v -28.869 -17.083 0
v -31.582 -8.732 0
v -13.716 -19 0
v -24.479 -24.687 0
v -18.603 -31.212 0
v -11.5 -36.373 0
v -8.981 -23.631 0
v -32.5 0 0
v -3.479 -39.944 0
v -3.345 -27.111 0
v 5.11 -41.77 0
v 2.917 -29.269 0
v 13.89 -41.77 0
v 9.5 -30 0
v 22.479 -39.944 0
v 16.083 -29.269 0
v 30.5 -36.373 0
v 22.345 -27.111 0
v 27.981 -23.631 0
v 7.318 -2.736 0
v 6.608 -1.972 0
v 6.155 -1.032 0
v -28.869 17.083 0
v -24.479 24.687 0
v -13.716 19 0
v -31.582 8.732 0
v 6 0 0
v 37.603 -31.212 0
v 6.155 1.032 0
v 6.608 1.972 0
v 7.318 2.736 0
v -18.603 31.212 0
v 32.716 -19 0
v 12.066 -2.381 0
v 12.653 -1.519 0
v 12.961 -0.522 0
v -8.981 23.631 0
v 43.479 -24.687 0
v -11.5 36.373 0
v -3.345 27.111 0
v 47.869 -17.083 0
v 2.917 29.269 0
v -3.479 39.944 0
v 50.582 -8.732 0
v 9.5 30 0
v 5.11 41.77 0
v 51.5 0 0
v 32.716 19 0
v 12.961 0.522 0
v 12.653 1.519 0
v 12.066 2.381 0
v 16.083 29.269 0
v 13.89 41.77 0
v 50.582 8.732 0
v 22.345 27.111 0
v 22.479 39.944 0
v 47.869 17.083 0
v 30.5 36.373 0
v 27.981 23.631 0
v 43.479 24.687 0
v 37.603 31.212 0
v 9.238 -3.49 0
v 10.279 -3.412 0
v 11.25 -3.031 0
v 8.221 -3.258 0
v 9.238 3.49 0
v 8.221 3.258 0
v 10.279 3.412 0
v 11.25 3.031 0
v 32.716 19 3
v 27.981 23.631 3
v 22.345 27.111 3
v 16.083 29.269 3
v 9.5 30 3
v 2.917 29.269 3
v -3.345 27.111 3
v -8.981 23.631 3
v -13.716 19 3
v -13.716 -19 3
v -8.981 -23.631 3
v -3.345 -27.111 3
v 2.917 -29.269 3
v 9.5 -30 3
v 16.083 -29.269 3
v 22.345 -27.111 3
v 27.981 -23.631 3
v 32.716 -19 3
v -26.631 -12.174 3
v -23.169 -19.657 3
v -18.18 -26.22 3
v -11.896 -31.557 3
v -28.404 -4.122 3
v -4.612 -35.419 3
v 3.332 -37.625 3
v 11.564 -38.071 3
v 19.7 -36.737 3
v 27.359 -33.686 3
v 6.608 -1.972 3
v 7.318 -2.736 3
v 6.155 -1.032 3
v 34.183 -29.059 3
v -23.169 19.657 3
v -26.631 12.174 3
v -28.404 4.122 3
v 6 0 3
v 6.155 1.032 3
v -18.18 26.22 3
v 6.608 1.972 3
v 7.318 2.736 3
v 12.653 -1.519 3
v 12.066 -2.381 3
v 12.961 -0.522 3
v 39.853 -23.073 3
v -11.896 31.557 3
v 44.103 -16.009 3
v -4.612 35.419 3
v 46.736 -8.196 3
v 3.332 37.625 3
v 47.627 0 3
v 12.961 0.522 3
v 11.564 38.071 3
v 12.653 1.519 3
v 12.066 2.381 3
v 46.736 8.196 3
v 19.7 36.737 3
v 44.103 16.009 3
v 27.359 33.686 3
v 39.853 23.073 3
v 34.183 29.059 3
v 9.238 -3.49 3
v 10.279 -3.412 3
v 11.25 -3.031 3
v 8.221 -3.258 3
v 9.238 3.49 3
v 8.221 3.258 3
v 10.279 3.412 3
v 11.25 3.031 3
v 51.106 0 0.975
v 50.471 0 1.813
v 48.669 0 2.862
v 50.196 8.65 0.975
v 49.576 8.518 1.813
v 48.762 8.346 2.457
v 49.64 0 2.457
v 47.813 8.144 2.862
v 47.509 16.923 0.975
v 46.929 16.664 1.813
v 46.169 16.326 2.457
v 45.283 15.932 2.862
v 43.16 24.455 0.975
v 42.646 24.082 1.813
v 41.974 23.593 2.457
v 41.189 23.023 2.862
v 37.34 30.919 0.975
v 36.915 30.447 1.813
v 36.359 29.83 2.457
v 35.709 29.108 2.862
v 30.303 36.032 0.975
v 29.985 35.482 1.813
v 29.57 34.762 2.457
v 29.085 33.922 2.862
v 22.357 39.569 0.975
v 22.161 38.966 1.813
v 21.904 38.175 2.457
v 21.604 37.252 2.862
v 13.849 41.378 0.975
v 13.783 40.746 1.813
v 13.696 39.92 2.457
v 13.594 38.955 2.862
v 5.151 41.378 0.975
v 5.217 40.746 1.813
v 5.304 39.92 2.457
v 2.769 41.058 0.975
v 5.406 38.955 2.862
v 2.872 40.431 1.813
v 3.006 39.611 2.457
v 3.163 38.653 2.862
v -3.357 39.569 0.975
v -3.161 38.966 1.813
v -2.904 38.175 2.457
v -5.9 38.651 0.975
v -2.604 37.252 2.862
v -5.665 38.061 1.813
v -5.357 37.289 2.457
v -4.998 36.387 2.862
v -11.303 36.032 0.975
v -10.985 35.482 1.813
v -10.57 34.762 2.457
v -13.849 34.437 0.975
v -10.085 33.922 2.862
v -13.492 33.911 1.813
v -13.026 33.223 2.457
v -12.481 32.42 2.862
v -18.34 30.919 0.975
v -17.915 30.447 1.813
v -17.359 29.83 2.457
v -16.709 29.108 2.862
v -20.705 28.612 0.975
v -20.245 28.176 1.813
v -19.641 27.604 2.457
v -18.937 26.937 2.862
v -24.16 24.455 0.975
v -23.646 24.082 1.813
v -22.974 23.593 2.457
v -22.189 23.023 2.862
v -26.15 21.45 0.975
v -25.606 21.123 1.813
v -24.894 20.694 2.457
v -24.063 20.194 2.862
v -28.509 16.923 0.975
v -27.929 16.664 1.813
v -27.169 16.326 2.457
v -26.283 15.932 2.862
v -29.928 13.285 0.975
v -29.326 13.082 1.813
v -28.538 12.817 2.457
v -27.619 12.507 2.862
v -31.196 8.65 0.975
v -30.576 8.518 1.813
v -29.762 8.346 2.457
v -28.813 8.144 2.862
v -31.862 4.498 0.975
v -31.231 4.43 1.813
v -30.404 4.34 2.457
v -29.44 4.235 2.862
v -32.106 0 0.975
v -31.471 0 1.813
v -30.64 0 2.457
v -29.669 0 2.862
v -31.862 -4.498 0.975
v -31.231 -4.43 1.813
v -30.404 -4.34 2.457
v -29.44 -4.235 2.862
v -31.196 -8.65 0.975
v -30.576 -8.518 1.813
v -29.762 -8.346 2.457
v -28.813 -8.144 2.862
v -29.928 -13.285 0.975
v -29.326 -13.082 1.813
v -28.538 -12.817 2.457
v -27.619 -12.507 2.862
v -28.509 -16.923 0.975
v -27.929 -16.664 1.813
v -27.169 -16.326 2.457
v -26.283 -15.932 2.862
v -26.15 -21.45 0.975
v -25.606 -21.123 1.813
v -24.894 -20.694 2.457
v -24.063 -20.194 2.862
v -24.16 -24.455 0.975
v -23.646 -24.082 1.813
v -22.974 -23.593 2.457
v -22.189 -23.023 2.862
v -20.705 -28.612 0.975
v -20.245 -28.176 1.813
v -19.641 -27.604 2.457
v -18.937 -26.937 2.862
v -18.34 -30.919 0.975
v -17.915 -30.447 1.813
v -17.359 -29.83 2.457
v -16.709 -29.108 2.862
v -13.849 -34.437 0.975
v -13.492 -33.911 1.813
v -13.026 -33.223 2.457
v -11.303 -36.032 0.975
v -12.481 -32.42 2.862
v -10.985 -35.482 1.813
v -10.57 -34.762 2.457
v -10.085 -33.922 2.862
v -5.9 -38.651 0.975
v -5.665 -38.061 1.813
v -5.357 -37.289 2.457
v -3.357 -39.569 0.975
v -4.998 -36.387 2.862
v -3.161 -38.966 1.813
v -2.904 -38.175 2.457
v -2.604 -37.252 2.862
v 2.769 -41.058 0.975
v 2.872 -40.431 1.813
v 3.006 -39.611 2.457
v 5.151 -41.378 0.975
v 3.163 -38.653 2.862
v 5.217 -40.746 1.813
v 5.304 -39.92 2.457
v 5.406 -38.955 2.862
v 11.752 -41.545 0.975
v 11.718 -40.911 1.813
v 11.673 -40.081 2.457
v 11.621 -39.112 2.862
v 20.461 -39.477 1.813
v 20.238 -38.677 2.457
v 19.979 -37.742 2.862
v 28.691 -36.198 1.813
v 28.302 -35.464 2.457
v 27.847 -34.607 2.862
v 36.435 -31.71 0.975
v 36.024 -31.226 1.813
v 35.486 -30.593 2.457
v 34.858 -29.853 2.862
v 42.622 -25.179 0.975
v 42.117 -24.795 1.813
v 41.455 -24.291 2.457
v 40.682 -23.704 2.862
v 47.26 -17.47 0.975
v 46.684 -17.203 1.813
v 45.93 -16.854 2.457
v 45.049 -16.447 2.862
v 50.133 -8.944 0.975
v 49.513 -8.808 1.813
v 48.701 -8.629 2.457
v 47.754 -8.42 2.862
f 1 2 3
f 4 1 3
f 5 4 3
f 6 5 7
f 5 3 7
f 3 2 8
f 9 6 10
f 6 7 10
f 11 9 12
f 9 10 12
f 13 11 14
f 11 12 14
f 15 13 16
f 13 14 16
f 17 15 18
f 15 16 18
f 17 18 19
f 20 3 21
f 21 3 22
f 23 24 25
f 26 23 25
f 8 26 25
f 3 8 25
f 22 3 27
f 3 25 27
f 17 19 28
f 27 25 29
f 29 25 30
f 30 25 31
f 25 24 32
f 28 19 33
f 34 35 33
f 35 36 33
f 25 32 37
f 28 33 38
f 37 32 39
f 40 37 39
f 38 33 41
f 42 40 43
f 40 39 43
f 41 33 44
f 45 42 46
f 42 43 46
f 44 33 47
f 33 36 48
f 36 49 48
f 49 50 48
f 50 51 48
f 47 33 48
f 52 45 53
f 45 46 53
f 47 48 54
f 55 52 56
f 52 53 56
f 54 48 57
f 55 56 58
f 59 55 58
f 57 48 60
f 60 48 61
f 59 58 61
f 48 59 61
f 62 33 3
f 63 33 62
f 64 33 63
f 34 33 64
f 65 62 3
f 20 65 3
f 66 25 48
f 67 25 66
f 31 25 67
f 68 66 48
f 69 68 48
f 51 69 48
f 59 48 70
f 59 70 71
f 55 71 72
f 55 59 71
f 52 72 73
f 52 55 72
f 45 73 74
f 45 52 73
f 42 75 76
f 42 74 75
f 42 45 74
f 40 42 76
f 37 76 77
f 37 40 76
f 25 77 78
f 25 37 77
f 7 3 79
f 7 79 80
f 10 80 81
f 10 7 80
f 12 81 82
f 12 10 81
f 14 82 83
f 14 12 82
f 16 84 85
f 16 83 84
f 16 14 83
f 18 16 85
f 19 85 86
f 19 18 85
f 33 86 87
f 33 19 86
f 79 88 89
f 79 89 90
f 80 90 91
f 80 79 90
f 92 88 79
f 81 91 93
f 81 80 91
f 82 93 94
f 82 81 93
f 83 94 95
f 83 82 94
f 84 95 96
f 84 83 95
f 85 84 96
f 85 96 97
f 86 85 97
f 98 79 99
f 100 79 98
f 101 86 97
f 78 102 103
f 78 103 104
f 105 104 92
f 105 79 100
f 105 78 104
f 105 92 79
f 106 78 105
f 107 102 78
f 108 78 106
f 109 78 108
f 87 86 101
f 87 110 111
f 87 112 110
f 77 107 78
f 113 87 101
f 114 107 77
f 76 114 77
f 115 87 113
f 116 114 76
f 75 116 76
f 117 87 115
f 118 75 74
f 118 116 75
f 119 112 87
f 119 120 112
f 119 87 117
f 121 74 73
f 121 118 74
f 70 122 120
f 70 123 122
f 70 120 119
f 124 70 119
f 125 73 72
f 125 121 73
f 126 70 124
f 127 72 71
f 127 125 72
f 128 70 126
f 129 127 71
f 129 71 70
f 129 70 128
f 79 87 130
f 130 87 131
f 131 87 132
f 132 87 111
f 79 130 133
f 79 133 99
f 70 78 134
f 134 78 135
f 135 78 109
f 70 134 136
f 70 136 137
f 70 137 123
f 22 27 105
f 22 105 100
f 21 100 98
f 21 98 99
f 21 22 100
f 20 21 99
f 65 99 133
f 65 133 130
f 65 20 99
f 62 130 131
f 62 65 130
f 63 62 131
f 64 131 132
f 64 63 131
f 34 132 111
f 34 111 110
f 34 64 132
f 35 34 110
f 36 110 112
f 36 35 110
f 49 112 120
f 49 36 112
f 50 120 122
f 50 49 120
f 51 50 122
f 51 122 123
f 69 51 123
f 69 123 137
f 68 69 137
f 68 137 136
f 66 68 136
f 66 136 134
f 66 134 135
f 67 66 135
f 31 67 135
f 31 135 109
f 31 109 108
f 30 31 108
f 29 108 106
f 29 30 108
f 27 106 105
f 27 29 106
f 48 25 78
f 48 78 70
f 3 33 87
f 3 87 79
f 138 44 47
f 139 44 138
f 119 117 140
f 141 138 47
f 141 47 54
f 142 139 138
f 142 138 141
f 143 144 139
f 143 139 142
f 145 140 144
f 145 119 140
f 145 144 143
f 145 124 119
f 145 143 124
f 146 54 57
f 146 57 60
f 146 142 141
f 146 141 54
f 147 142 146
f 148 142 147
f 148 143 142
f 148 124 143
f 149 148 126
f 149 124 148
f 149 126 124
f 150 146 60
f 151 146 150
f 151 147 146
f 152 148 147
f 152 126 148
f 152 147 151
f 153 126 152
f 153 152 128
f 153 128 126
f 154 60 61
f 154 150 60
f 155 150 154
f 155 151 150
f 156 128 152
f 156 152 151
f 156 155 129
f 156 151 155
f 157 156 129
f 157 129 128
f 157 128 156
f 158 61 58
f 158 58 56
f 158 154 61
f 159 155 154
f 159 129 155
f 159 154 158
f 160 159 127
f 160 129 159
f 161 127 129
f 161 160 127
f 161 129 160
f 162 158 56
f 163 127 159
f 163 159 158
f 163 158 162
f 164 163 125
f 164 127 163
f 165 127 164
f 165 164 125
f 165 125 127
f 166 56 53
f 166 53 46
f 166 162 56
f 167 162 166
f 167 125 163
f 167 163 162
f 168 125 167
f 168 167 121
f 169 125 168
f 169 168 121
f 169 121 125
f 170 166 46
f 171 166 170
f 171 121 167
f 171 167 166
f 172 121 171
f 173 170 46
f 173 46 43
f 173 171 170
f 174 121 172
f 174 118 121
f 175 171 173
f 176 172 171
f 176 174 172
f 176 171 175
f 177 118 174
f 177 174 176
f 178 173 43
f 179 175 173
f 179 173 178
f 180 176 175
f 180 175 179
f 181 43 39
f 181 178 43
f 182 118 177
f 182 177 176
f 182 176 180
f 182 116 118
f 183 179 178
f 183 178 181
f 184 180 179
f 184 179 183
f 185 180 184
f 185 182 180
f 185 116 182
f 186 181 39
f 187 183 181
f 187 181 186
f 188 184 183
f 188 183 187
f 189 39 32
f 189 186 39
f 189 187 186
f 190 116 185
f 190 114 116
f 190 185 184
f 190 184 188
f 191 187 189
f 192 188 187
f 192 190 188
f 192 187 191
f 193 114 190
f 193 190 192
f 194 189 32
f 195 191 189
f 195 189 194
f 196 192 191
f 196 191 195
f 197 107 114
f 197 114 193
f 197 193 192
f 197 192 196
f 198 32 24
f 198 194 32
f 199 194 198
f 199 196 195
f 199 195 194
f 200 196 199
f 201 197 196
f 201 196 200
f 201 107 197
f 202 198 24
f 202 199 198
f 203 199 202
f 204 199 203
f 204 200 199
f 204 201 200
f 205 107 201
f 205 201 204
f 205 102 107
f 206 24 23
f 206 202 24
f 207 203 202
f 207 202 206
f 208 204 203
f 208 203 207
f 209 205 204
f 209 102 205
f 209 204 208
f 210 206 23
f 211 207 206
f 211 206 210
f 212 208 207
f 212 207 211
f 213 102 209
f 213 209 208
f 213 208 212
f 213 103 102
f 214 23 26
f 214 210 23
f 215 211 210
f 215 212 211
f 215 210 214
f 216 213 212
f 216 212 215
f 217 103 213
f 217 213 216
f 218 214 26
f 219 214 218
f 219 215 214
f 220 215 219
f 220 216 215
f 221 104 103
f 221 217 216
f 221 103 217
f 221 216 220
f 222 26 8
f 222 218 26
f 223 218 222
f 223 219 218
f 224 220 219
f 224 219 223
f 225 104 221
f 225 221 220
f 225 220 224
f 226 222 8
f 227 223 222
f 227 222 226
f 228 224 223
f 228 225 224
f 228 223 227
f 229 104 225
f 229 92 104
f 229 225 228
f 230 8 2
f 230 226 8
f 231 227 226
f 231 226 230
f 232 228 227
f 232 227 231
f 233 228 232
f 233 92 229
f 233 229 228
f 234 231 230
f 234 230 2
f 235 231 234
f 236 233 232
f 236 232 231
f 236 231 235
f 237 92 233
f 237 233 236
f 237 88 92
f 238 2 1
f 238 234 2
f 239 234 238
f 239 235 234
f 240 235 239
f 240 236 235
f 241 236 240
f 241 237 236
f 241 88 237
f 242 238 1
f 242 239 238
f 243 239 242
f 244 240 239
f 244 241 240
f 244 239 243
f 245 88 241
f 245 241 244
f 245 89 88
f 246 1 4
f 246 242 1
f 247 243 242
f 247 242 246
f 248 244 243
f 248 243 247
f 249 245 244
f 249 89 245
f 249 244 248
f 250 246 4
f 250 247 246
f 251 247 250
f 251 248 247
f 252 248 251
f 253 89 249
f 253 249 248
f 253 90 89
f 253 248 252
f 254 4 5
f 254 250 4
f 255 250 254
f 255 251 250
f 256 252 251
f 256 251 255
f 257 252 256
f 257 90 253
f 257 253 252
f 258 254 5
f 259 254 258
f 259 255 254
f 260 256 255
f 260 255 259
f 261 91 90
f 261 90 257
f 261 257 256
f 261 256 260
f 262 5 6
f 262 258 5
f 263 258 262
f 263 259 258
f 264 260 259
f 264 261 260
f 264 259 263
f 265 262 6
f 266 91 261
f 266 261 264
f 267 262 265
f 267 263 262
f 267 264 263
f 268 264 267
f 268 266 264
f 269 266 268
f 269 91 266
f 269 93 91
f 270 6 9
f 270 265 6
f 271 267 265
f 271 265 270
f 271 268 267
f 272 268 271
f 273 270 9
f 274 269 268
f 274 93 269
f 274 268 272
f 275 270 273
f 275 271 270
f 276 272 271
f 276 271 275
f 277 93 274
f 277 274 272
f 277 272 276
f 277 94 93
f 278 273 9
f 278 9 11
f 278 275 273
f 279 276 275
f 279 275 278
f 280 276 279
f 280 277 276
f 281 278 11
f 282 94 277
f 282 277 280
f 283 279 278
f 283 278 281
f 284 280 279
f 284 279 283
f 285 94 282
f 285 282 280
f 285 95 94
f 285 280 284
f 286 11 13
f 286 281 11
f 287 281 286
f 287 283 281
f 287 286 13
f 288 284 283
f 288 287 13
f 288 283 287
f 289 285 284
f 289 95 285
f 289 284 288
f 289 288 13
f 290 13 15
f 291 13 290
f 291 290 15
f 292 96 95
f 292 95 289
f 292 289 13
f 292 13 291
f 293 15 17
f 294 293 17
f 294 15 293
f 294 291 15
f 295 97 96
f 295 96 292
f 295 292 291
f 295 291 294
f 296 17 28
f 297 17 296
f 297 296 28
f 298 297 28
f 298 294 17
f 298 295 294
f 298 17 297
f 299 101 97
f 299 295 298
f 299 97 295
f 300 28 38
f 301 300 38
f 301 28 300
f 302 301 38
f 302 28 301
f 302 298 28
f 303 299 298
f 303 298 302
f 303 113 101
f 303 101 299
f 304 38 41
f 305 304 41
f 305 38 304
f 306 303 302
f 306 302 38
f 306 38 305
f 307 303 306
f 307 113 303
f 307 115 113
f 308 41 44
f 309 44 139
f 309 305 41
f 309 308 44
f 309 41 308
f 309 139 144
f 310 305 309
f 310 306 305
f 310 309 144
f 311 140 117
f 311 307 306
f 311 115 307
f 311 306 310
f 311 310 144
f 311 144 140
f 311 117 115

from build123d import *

# Parameters (mm, degrees)
F1_R     = 42
F2_DEPTH = 3
F3_DEPTH = 3
F6_DEPTH = 30


# Not quite as in the source:
# - a fillet or chamfer that OpenCascade refuses, or shapes differently, is made with other operations: its cross-section is extruded or revolved along the edge and cut away or added


with BuildPart() as f2:
    # F1 (on Top) → F2 (new body)
    with BuildSketch(Plane.XY):
        with Locations((9.5, 0)):
            Circle(F1_R)
    extrude(amount=F2_DEPTH)

    # F0 (on Top) → F3 (cut)
    with BuildSketch(Plane.XY):
        with BuildLine():
            Line((6, 0), (13, 0))
            ThreePointArc((13, 0), (9.5, 3.5), (6, 0))
        make_face()
        with BuildLine():
            ThreePointArc((6, 0), (9.5, -3.5), (13, 0))
            Line((13, 0), (6, 0))
        make_face()
    extrude(amount=F3_DEPTH, mode=Mode.SUBTRACT)

    # F4: fillet of radius 4 on 1 edges, made by hand

    # F4_s1 → F4_t2 (revolve, cut)
    with BuildSketch(Plane.XZ):
        with BuildLine():
            ThreePointArc((51.5, 0), (50.0765063966, 2.1622776602), (47.6270166538, 3))
            Line((47.6270166538, 3), (51.5, 3))
            Line((51.5, 3), (51.5, 0))
        make_face()
    revolve(axis=Axis((9.5, 0, 3), (0, 0, 1)), mode=Mode.SUBTRACT)

    # F5 (on face) → F6 (cut)
    with BuildSketch(Plane.XY):
        with BuildLine():
            Line((-13.7163735325, 19), (32.7163735325, 19))
            ThreePointArc((32.7163735325, 19), (9.5, 30), (-13.7163735325, 19))
        make_face()
        with BuildLine():
            Line((32.7163735325, -19), (-13.7163735325, -19))
            ThreePointArc((-13.7163735325, -19), (9.5, -30), (32.7163735325, -19))
        make_face()
    extrude(amount=F6_DEPTH, mode=Mode.SUBTRACT)


solid = f2.part
